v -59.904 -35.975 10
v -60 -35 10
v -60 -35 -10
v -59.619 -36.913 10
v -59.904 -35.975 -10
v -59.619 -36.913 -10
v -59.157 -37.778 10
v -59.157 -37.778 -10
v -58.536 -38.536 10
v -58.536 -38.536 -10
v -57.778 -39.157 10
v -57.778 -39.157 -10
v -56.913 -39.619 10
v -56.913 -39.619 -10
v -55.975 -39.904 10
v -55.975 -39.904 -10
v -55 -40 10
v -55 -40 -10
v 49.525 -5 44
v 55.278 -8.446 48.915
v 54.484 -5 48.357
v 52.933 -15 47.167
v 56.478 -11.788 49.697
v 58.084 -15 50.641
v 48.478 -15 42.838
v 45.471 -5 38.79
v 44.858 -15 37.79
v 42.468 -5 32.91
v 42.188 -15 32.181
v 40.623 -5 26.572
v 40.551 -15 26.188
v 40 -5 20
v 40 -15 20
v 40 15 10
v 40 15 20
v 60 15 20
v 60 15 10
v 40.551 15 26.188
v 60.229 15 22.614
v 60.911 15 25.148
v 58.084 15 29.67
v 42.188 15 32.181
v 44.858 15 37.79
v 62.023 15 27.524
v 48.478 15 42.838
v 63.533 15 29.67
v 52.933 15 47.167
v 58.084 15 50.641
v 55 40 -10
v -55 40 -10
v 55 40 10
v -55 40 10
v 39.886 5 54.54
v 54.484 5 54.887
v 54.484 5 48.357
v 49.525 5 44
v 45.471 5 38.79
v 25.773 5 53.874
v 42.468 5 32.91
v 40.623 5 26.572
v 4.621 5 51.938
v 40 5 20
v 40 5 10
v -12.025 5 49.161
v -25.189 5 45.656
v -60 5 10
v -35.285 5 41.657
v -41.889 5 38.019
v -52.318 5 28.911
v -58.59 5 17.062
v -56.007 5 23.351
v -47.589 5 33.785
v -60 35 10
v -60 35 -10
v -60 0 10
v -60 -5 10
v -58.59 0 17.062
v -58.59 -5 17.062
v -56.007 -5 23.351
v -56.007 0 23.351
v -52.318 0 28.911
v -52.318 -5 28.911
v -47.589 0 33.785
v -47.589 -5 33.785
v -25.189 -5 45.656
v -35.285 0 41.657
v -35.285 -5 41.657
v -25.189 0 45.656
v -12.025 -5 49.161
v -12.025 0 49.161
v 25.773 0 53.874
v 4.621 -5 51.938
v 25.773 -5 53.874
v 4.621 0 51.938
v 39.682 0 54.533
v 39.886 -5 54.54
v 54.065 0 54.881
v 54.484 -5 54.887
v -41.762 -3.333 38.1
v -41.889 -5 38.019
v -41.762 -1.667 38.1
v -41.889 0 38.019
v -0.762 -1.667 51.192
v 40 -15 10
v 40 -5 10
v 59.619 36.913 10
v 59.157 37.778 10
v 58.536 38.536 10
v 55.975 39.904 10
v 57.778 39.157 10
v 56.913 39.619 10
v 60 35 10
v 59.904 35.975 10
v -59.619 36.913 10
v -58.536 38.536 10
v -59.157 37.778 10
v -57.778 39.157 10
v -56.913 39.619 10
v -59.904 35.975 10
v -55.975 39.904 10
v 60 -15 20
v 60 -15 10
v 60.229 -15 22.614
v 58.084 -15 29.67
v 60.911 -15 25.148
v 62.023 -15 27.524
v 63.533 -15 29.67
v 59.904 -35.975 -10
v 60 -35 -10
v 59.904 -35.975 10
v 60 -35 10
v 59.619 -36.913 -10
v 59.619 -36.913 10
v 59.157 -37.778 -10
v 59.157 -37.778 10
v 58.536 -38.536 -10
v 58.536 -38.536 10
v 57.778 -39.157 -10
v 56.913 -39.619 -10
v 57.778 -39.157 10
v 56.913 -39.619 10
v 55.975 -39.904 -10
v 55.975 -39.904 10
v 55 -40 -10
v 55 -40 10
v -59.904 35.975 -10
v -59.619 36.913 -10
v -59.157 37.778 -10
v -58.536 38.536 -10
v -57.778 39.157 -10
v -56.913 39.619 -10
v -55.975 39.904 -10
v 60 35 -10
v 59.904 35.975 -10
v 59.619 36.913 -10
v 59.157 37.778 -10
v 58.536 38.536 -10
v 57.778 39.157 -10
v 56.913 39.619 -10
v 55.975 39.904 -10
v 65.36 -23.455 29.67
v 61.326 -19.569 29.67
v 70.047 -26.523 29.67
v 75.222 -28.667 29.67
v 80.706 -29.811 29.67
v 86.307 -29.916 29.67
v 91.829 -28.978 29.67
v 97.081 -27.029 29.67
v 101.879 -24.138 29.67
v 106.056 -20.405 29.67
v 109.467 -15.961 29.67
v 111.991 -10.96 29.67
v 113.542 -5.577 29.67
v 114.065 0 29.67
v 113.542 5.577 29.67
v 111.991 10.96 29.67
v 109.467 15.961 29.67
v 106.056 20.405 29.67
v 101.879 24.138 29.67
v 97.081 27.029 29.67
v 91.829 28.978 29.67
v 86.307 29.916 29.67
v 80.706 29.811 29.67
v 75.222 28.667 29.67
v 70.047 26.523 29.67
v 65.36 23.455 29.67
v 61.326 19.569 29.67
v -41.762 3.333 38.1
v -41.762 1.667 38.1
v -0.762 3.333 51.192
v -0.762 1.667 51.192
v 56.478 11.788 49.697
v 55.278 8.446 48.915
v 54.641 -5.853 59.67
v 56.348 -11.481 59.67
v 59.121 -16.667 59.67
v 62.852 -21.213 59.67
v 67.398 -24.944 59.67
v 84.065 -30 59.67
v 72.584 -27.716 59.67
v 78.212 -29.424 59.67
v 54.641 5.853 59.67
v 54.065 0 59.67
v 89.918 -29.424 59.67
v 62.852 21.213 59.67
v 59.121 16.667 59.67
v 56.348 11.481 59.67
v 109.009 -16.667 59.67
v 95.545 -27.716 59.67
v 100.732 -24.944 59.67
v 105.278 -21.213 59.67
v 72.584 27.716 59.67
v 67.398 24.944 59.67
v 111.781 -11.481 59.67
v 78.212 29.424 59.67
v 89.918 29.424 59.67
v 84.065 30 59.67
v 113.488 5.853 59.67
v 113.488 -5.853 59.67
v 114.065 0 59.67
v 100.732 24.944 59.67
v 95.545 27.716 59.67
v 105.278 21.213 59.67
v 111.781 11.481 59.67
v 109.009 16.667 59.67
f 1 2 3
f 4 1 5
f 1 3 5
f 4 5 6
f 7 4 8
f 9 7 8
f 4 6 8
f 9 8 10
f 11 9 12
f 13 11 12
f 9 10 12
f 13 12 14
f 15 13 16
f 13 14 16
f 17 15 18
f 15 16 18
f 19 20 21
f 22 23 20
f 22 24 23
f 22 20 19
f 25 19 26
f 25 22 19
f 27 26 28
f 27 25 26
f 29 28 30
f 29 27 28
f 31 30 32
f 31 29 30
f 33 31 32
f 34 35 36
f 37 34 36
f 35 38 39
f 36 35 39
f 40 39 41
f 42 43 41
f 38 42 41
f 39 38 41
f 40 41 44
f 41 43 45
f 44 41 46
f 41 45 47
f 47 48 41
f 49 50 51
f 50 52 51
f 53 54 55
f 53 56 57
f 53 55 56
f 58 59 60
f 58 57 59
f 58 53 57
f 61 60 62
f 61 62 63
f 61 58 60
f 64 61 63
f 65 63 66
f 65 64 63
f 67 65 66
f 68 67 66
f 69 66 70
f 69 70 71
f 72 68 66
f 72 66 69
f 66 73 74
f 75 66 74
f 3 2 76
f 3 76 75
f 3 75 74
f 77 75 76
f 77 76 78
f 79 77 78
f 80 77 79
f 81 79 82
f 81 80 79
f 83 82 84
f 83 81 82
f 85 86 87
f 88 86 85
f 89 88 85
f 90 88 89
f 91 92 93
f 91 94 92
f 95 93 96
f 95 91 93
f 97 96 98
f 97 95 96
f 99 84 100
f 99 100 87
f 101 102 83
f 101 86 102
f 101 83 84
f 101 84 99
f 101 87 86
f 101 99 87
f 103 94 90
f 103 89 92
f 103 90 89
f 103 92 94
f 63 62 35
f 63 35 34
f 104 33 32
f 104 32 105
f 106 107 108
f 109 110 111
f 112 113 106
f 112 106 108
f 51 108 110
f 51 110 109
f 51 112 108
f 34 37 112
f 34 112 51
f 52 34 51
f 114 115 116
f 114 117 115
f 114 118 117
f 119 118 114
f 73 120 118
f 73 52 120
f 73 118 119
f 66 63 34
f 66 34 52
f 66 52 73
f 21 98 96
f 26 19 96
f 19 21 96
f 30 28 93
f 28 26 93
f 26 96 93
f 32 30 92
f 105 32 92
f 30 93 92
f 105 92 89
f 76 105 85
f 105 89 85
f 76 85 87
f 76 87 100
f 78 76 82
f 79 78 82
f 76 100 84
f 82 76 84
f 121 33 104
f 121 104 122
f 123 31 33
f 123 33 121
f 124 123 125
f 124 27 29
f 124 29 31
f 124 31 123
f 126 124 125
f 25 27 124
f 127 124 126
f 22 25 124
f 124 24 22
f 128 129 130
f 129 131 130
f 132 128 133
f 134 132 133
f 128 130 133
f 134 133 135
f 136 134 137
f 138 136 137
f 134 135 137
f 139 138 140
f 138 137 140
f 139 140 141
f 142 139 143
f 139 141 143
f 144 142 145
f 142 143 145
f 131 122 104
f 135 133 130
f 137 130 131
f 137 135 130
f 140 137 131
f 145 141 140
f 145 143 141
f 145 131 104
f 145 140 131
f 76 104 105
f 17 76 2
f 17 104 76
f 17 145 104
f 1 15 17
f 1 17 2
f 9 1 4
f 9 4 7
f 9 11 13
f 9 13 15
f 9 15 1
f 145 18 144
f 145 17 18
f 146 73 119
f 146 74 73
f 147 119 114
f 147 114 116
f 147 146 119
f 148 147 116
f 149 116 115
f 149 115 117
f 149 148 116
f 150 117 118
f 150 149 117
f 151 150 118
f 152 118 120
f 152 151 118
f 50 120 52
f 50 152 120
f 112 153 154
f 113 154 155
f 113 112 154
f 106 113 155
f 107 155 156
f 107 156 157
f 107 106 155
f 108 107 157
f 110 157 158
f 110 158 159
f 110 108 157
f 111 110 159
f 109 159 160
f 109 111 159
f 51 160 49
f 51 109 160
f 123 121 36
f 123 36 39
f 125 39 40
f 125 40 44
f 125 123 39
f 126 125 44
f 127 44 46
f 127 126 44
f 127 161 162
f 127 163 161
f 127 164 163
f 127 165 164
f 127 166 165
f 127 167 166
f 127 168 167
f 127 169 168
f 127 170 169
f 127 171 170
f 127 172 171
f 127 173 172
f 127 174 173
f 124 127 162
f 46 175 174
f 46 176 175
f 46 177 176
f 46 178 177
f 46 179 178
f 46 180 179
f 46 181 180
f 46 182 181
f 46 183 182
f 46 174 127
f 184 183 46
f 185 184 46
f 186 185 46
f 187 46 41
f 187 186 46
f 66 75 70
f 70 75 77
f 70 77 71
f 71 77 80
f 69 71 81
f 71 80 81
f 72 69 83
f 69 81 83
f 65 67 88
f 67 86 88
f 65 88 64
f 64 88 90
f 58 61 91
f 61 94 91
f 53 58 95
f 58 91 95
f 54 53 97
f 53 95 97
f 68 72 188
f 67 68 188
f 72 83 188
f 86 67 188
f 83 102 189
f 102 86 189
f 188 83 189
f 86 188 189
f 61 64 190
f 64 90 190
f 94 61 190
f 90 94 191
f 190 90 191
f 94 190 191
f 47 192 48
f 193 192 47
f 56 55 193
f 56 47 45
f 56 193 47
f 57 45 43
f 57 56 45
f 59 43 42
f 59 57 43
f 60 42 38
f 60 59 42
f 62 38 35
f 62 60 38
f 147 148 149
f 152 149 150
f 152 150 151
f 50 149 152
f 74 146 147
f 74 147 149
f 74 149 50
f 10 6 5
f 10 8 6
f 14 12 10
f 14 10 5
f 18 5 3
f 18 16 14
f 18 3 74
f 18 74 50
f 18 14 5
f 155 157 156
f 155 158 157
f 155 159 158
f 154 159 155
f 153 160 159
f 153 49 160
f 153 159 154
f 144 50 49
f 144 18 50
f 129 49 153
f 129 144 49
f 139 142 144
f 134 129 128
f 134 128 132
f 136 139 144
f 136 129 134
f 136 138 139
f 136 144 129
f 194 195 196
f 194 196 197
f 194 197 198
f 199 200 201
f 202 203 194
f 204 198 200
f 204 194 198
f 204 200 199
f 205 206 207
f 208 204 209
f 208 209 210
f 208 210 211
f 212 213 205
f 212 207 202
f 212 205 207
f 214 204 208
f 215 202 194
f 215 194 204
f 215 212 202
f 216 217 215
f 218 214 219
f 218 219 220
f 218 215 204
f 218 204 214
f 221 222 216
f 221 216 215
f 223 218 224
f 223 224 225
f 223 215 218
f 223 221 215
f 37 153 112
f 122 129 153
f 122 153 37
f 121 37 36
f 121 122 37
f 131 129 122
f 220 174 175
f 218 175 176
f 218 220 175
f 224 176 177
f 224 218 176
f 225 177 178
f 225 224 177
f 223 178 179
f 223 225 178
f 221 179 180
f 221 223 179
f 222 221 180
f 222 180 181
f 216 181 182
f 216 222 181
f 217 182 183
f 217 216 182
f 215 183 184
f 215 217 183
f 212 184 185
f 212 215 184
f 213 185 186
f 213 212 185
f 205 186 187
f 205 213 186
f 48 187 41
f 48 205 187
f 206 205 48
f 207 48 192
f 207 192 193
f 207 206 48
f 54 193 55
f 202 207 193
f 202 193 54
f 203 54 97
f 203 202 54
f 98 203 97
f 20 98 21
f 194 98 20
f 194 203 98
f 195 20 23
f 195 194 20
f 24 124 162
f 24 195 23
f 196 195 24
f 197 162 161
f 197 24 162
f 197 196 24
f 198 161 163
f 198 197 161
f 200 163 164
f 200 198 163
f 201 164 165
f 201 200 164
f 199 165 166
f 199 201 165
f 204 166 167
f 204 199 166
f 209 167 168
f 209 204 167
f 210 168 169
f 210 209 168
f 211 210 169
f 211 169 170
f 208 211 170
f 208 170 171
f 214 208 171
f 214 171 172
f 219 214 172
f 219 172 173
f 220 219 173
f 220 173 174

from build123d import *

# Parameters (mm, degrees)
F1_DEPTH = 40
F2_DEPTH = 15
F3_DEPTH = 5
F5_R     = 5


with BuildPart() as f1:
    # F0 (on Front) → F1 (new body, symmetric)
    with BuildSketch(Plane.XZ):
        Polygon((-60, -10), (60, -10), (60, 10), (40, 10), (-60, 10), align=None)
    extrude(amount=F1_DEPTH, both=True)

    # F0 (on Front) → F2 (join, symmetric)
    with BuildSketch(Plane.XZ):
        with BuildLine():
            Line((40, 10), (60, 10))
            Line((60, 10), (60, 20))
            ThreePointArc((60, 20), (64.393398, 30.606602), (75, 35))
            Line((75, 35), (84.064805, 35))
            Line((84.064805, 35), (84.064805, 55))
            Line((84.064805, 55), (75, 55))
            ThreePointArc((75, 55), (50.251263, 44.748737), (40, 20))
            Line((40, 20), (40, 10))
        make_face()
    extrude(amount=F2_DEPTH, both=True)

    # F0 (on Front) → F3 (join, symmetric)
    with BuildSketch(Plane.XZ):
        with BuildLine():
            add(Edge.make_bspline(
                [(-60, 10), (-55.525135, 51.721793), (7.100719, 55.106737), (75, 55)],
                knots=[0, 0, 0, 0, 142.302495, 142.302495, 142.302495, 142.302495], degree=3))
            Line((-60, 10), (40, 10))
            Line((40, 10), (40, 20))
            ThreePointArc((40, 20), (50.251263, 44.748737), (75, 55))
        make_face()
    extrude(amount=F3_DEPTH, both=True)

    # F0 (on Front) → F4 (revolve)
    with BuildSketch(Plane.XZ):
        Polygon((84.064805, 59.669833), (84.064805, 55), (84.064805, 35), (84.064805, 29.669833), (114.064805, 29.669833), (114.064805, 59.669833), align=None)
    revolve(axis=Axis((84.064805, 0, 44.669833), (0, 0, 1)))

    # F5
    f5_edges = [f1.edges().sort_by_distance(p)[0] for p in [
        (-60, -40, 0),
        (60, -40, 0),
        (60, 40, 0),
        (-60, 40, 0),
    ]]
    fillet(f5_edges, radius=F5_R)


solid = f1.part
